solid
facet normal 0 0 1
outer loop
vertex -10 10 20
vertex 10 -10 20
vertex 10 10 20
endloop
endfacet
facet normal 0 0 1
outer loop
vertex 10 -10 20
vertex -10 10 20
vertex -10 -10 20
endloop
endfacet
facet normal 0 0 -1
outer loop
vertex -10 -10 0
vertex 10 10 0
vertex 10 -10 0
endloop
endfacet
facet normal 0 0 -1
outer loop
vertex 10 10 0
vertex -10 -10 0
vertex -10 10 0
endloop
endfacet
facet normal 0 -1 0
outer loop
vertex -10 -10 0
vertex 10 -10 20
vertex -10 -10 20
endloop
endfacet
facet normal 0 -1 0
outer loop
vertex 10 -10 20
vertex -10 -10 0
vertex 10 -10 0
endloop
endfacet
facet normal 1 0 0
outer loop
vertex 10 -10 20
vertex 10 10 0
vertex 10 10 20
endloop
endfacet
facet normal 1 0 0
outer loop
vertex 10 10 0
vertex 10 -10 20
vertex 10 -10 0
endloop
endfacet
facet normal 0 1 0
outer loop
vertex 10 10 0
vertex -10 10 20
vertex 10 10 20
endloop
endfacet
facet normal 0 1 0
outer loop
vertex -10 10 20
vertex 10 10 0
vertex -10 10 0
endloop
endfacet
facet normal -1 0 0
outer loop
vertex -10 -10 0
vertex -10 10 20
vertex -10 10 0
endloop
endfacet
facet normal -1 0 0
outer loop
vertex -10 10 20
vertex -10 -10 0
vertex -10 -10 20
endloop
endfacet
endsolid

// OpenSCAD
// orcad: rectangular block, optionally with rounded vertical edges.
length = 20;
width = 20;
height = 20;
corner_radius = 0;

r = min(corner_radius, length / 2 - 0.01, width / 2 - 0.01);
if (r > 0) {
    linear_extrude(height)
        offset(r = r) square([length - 2 * r, width - 2 * r], center = true);
} else {
    translate([-length / 2, -width / 2, 0]) cube([length, width, height]);
}
